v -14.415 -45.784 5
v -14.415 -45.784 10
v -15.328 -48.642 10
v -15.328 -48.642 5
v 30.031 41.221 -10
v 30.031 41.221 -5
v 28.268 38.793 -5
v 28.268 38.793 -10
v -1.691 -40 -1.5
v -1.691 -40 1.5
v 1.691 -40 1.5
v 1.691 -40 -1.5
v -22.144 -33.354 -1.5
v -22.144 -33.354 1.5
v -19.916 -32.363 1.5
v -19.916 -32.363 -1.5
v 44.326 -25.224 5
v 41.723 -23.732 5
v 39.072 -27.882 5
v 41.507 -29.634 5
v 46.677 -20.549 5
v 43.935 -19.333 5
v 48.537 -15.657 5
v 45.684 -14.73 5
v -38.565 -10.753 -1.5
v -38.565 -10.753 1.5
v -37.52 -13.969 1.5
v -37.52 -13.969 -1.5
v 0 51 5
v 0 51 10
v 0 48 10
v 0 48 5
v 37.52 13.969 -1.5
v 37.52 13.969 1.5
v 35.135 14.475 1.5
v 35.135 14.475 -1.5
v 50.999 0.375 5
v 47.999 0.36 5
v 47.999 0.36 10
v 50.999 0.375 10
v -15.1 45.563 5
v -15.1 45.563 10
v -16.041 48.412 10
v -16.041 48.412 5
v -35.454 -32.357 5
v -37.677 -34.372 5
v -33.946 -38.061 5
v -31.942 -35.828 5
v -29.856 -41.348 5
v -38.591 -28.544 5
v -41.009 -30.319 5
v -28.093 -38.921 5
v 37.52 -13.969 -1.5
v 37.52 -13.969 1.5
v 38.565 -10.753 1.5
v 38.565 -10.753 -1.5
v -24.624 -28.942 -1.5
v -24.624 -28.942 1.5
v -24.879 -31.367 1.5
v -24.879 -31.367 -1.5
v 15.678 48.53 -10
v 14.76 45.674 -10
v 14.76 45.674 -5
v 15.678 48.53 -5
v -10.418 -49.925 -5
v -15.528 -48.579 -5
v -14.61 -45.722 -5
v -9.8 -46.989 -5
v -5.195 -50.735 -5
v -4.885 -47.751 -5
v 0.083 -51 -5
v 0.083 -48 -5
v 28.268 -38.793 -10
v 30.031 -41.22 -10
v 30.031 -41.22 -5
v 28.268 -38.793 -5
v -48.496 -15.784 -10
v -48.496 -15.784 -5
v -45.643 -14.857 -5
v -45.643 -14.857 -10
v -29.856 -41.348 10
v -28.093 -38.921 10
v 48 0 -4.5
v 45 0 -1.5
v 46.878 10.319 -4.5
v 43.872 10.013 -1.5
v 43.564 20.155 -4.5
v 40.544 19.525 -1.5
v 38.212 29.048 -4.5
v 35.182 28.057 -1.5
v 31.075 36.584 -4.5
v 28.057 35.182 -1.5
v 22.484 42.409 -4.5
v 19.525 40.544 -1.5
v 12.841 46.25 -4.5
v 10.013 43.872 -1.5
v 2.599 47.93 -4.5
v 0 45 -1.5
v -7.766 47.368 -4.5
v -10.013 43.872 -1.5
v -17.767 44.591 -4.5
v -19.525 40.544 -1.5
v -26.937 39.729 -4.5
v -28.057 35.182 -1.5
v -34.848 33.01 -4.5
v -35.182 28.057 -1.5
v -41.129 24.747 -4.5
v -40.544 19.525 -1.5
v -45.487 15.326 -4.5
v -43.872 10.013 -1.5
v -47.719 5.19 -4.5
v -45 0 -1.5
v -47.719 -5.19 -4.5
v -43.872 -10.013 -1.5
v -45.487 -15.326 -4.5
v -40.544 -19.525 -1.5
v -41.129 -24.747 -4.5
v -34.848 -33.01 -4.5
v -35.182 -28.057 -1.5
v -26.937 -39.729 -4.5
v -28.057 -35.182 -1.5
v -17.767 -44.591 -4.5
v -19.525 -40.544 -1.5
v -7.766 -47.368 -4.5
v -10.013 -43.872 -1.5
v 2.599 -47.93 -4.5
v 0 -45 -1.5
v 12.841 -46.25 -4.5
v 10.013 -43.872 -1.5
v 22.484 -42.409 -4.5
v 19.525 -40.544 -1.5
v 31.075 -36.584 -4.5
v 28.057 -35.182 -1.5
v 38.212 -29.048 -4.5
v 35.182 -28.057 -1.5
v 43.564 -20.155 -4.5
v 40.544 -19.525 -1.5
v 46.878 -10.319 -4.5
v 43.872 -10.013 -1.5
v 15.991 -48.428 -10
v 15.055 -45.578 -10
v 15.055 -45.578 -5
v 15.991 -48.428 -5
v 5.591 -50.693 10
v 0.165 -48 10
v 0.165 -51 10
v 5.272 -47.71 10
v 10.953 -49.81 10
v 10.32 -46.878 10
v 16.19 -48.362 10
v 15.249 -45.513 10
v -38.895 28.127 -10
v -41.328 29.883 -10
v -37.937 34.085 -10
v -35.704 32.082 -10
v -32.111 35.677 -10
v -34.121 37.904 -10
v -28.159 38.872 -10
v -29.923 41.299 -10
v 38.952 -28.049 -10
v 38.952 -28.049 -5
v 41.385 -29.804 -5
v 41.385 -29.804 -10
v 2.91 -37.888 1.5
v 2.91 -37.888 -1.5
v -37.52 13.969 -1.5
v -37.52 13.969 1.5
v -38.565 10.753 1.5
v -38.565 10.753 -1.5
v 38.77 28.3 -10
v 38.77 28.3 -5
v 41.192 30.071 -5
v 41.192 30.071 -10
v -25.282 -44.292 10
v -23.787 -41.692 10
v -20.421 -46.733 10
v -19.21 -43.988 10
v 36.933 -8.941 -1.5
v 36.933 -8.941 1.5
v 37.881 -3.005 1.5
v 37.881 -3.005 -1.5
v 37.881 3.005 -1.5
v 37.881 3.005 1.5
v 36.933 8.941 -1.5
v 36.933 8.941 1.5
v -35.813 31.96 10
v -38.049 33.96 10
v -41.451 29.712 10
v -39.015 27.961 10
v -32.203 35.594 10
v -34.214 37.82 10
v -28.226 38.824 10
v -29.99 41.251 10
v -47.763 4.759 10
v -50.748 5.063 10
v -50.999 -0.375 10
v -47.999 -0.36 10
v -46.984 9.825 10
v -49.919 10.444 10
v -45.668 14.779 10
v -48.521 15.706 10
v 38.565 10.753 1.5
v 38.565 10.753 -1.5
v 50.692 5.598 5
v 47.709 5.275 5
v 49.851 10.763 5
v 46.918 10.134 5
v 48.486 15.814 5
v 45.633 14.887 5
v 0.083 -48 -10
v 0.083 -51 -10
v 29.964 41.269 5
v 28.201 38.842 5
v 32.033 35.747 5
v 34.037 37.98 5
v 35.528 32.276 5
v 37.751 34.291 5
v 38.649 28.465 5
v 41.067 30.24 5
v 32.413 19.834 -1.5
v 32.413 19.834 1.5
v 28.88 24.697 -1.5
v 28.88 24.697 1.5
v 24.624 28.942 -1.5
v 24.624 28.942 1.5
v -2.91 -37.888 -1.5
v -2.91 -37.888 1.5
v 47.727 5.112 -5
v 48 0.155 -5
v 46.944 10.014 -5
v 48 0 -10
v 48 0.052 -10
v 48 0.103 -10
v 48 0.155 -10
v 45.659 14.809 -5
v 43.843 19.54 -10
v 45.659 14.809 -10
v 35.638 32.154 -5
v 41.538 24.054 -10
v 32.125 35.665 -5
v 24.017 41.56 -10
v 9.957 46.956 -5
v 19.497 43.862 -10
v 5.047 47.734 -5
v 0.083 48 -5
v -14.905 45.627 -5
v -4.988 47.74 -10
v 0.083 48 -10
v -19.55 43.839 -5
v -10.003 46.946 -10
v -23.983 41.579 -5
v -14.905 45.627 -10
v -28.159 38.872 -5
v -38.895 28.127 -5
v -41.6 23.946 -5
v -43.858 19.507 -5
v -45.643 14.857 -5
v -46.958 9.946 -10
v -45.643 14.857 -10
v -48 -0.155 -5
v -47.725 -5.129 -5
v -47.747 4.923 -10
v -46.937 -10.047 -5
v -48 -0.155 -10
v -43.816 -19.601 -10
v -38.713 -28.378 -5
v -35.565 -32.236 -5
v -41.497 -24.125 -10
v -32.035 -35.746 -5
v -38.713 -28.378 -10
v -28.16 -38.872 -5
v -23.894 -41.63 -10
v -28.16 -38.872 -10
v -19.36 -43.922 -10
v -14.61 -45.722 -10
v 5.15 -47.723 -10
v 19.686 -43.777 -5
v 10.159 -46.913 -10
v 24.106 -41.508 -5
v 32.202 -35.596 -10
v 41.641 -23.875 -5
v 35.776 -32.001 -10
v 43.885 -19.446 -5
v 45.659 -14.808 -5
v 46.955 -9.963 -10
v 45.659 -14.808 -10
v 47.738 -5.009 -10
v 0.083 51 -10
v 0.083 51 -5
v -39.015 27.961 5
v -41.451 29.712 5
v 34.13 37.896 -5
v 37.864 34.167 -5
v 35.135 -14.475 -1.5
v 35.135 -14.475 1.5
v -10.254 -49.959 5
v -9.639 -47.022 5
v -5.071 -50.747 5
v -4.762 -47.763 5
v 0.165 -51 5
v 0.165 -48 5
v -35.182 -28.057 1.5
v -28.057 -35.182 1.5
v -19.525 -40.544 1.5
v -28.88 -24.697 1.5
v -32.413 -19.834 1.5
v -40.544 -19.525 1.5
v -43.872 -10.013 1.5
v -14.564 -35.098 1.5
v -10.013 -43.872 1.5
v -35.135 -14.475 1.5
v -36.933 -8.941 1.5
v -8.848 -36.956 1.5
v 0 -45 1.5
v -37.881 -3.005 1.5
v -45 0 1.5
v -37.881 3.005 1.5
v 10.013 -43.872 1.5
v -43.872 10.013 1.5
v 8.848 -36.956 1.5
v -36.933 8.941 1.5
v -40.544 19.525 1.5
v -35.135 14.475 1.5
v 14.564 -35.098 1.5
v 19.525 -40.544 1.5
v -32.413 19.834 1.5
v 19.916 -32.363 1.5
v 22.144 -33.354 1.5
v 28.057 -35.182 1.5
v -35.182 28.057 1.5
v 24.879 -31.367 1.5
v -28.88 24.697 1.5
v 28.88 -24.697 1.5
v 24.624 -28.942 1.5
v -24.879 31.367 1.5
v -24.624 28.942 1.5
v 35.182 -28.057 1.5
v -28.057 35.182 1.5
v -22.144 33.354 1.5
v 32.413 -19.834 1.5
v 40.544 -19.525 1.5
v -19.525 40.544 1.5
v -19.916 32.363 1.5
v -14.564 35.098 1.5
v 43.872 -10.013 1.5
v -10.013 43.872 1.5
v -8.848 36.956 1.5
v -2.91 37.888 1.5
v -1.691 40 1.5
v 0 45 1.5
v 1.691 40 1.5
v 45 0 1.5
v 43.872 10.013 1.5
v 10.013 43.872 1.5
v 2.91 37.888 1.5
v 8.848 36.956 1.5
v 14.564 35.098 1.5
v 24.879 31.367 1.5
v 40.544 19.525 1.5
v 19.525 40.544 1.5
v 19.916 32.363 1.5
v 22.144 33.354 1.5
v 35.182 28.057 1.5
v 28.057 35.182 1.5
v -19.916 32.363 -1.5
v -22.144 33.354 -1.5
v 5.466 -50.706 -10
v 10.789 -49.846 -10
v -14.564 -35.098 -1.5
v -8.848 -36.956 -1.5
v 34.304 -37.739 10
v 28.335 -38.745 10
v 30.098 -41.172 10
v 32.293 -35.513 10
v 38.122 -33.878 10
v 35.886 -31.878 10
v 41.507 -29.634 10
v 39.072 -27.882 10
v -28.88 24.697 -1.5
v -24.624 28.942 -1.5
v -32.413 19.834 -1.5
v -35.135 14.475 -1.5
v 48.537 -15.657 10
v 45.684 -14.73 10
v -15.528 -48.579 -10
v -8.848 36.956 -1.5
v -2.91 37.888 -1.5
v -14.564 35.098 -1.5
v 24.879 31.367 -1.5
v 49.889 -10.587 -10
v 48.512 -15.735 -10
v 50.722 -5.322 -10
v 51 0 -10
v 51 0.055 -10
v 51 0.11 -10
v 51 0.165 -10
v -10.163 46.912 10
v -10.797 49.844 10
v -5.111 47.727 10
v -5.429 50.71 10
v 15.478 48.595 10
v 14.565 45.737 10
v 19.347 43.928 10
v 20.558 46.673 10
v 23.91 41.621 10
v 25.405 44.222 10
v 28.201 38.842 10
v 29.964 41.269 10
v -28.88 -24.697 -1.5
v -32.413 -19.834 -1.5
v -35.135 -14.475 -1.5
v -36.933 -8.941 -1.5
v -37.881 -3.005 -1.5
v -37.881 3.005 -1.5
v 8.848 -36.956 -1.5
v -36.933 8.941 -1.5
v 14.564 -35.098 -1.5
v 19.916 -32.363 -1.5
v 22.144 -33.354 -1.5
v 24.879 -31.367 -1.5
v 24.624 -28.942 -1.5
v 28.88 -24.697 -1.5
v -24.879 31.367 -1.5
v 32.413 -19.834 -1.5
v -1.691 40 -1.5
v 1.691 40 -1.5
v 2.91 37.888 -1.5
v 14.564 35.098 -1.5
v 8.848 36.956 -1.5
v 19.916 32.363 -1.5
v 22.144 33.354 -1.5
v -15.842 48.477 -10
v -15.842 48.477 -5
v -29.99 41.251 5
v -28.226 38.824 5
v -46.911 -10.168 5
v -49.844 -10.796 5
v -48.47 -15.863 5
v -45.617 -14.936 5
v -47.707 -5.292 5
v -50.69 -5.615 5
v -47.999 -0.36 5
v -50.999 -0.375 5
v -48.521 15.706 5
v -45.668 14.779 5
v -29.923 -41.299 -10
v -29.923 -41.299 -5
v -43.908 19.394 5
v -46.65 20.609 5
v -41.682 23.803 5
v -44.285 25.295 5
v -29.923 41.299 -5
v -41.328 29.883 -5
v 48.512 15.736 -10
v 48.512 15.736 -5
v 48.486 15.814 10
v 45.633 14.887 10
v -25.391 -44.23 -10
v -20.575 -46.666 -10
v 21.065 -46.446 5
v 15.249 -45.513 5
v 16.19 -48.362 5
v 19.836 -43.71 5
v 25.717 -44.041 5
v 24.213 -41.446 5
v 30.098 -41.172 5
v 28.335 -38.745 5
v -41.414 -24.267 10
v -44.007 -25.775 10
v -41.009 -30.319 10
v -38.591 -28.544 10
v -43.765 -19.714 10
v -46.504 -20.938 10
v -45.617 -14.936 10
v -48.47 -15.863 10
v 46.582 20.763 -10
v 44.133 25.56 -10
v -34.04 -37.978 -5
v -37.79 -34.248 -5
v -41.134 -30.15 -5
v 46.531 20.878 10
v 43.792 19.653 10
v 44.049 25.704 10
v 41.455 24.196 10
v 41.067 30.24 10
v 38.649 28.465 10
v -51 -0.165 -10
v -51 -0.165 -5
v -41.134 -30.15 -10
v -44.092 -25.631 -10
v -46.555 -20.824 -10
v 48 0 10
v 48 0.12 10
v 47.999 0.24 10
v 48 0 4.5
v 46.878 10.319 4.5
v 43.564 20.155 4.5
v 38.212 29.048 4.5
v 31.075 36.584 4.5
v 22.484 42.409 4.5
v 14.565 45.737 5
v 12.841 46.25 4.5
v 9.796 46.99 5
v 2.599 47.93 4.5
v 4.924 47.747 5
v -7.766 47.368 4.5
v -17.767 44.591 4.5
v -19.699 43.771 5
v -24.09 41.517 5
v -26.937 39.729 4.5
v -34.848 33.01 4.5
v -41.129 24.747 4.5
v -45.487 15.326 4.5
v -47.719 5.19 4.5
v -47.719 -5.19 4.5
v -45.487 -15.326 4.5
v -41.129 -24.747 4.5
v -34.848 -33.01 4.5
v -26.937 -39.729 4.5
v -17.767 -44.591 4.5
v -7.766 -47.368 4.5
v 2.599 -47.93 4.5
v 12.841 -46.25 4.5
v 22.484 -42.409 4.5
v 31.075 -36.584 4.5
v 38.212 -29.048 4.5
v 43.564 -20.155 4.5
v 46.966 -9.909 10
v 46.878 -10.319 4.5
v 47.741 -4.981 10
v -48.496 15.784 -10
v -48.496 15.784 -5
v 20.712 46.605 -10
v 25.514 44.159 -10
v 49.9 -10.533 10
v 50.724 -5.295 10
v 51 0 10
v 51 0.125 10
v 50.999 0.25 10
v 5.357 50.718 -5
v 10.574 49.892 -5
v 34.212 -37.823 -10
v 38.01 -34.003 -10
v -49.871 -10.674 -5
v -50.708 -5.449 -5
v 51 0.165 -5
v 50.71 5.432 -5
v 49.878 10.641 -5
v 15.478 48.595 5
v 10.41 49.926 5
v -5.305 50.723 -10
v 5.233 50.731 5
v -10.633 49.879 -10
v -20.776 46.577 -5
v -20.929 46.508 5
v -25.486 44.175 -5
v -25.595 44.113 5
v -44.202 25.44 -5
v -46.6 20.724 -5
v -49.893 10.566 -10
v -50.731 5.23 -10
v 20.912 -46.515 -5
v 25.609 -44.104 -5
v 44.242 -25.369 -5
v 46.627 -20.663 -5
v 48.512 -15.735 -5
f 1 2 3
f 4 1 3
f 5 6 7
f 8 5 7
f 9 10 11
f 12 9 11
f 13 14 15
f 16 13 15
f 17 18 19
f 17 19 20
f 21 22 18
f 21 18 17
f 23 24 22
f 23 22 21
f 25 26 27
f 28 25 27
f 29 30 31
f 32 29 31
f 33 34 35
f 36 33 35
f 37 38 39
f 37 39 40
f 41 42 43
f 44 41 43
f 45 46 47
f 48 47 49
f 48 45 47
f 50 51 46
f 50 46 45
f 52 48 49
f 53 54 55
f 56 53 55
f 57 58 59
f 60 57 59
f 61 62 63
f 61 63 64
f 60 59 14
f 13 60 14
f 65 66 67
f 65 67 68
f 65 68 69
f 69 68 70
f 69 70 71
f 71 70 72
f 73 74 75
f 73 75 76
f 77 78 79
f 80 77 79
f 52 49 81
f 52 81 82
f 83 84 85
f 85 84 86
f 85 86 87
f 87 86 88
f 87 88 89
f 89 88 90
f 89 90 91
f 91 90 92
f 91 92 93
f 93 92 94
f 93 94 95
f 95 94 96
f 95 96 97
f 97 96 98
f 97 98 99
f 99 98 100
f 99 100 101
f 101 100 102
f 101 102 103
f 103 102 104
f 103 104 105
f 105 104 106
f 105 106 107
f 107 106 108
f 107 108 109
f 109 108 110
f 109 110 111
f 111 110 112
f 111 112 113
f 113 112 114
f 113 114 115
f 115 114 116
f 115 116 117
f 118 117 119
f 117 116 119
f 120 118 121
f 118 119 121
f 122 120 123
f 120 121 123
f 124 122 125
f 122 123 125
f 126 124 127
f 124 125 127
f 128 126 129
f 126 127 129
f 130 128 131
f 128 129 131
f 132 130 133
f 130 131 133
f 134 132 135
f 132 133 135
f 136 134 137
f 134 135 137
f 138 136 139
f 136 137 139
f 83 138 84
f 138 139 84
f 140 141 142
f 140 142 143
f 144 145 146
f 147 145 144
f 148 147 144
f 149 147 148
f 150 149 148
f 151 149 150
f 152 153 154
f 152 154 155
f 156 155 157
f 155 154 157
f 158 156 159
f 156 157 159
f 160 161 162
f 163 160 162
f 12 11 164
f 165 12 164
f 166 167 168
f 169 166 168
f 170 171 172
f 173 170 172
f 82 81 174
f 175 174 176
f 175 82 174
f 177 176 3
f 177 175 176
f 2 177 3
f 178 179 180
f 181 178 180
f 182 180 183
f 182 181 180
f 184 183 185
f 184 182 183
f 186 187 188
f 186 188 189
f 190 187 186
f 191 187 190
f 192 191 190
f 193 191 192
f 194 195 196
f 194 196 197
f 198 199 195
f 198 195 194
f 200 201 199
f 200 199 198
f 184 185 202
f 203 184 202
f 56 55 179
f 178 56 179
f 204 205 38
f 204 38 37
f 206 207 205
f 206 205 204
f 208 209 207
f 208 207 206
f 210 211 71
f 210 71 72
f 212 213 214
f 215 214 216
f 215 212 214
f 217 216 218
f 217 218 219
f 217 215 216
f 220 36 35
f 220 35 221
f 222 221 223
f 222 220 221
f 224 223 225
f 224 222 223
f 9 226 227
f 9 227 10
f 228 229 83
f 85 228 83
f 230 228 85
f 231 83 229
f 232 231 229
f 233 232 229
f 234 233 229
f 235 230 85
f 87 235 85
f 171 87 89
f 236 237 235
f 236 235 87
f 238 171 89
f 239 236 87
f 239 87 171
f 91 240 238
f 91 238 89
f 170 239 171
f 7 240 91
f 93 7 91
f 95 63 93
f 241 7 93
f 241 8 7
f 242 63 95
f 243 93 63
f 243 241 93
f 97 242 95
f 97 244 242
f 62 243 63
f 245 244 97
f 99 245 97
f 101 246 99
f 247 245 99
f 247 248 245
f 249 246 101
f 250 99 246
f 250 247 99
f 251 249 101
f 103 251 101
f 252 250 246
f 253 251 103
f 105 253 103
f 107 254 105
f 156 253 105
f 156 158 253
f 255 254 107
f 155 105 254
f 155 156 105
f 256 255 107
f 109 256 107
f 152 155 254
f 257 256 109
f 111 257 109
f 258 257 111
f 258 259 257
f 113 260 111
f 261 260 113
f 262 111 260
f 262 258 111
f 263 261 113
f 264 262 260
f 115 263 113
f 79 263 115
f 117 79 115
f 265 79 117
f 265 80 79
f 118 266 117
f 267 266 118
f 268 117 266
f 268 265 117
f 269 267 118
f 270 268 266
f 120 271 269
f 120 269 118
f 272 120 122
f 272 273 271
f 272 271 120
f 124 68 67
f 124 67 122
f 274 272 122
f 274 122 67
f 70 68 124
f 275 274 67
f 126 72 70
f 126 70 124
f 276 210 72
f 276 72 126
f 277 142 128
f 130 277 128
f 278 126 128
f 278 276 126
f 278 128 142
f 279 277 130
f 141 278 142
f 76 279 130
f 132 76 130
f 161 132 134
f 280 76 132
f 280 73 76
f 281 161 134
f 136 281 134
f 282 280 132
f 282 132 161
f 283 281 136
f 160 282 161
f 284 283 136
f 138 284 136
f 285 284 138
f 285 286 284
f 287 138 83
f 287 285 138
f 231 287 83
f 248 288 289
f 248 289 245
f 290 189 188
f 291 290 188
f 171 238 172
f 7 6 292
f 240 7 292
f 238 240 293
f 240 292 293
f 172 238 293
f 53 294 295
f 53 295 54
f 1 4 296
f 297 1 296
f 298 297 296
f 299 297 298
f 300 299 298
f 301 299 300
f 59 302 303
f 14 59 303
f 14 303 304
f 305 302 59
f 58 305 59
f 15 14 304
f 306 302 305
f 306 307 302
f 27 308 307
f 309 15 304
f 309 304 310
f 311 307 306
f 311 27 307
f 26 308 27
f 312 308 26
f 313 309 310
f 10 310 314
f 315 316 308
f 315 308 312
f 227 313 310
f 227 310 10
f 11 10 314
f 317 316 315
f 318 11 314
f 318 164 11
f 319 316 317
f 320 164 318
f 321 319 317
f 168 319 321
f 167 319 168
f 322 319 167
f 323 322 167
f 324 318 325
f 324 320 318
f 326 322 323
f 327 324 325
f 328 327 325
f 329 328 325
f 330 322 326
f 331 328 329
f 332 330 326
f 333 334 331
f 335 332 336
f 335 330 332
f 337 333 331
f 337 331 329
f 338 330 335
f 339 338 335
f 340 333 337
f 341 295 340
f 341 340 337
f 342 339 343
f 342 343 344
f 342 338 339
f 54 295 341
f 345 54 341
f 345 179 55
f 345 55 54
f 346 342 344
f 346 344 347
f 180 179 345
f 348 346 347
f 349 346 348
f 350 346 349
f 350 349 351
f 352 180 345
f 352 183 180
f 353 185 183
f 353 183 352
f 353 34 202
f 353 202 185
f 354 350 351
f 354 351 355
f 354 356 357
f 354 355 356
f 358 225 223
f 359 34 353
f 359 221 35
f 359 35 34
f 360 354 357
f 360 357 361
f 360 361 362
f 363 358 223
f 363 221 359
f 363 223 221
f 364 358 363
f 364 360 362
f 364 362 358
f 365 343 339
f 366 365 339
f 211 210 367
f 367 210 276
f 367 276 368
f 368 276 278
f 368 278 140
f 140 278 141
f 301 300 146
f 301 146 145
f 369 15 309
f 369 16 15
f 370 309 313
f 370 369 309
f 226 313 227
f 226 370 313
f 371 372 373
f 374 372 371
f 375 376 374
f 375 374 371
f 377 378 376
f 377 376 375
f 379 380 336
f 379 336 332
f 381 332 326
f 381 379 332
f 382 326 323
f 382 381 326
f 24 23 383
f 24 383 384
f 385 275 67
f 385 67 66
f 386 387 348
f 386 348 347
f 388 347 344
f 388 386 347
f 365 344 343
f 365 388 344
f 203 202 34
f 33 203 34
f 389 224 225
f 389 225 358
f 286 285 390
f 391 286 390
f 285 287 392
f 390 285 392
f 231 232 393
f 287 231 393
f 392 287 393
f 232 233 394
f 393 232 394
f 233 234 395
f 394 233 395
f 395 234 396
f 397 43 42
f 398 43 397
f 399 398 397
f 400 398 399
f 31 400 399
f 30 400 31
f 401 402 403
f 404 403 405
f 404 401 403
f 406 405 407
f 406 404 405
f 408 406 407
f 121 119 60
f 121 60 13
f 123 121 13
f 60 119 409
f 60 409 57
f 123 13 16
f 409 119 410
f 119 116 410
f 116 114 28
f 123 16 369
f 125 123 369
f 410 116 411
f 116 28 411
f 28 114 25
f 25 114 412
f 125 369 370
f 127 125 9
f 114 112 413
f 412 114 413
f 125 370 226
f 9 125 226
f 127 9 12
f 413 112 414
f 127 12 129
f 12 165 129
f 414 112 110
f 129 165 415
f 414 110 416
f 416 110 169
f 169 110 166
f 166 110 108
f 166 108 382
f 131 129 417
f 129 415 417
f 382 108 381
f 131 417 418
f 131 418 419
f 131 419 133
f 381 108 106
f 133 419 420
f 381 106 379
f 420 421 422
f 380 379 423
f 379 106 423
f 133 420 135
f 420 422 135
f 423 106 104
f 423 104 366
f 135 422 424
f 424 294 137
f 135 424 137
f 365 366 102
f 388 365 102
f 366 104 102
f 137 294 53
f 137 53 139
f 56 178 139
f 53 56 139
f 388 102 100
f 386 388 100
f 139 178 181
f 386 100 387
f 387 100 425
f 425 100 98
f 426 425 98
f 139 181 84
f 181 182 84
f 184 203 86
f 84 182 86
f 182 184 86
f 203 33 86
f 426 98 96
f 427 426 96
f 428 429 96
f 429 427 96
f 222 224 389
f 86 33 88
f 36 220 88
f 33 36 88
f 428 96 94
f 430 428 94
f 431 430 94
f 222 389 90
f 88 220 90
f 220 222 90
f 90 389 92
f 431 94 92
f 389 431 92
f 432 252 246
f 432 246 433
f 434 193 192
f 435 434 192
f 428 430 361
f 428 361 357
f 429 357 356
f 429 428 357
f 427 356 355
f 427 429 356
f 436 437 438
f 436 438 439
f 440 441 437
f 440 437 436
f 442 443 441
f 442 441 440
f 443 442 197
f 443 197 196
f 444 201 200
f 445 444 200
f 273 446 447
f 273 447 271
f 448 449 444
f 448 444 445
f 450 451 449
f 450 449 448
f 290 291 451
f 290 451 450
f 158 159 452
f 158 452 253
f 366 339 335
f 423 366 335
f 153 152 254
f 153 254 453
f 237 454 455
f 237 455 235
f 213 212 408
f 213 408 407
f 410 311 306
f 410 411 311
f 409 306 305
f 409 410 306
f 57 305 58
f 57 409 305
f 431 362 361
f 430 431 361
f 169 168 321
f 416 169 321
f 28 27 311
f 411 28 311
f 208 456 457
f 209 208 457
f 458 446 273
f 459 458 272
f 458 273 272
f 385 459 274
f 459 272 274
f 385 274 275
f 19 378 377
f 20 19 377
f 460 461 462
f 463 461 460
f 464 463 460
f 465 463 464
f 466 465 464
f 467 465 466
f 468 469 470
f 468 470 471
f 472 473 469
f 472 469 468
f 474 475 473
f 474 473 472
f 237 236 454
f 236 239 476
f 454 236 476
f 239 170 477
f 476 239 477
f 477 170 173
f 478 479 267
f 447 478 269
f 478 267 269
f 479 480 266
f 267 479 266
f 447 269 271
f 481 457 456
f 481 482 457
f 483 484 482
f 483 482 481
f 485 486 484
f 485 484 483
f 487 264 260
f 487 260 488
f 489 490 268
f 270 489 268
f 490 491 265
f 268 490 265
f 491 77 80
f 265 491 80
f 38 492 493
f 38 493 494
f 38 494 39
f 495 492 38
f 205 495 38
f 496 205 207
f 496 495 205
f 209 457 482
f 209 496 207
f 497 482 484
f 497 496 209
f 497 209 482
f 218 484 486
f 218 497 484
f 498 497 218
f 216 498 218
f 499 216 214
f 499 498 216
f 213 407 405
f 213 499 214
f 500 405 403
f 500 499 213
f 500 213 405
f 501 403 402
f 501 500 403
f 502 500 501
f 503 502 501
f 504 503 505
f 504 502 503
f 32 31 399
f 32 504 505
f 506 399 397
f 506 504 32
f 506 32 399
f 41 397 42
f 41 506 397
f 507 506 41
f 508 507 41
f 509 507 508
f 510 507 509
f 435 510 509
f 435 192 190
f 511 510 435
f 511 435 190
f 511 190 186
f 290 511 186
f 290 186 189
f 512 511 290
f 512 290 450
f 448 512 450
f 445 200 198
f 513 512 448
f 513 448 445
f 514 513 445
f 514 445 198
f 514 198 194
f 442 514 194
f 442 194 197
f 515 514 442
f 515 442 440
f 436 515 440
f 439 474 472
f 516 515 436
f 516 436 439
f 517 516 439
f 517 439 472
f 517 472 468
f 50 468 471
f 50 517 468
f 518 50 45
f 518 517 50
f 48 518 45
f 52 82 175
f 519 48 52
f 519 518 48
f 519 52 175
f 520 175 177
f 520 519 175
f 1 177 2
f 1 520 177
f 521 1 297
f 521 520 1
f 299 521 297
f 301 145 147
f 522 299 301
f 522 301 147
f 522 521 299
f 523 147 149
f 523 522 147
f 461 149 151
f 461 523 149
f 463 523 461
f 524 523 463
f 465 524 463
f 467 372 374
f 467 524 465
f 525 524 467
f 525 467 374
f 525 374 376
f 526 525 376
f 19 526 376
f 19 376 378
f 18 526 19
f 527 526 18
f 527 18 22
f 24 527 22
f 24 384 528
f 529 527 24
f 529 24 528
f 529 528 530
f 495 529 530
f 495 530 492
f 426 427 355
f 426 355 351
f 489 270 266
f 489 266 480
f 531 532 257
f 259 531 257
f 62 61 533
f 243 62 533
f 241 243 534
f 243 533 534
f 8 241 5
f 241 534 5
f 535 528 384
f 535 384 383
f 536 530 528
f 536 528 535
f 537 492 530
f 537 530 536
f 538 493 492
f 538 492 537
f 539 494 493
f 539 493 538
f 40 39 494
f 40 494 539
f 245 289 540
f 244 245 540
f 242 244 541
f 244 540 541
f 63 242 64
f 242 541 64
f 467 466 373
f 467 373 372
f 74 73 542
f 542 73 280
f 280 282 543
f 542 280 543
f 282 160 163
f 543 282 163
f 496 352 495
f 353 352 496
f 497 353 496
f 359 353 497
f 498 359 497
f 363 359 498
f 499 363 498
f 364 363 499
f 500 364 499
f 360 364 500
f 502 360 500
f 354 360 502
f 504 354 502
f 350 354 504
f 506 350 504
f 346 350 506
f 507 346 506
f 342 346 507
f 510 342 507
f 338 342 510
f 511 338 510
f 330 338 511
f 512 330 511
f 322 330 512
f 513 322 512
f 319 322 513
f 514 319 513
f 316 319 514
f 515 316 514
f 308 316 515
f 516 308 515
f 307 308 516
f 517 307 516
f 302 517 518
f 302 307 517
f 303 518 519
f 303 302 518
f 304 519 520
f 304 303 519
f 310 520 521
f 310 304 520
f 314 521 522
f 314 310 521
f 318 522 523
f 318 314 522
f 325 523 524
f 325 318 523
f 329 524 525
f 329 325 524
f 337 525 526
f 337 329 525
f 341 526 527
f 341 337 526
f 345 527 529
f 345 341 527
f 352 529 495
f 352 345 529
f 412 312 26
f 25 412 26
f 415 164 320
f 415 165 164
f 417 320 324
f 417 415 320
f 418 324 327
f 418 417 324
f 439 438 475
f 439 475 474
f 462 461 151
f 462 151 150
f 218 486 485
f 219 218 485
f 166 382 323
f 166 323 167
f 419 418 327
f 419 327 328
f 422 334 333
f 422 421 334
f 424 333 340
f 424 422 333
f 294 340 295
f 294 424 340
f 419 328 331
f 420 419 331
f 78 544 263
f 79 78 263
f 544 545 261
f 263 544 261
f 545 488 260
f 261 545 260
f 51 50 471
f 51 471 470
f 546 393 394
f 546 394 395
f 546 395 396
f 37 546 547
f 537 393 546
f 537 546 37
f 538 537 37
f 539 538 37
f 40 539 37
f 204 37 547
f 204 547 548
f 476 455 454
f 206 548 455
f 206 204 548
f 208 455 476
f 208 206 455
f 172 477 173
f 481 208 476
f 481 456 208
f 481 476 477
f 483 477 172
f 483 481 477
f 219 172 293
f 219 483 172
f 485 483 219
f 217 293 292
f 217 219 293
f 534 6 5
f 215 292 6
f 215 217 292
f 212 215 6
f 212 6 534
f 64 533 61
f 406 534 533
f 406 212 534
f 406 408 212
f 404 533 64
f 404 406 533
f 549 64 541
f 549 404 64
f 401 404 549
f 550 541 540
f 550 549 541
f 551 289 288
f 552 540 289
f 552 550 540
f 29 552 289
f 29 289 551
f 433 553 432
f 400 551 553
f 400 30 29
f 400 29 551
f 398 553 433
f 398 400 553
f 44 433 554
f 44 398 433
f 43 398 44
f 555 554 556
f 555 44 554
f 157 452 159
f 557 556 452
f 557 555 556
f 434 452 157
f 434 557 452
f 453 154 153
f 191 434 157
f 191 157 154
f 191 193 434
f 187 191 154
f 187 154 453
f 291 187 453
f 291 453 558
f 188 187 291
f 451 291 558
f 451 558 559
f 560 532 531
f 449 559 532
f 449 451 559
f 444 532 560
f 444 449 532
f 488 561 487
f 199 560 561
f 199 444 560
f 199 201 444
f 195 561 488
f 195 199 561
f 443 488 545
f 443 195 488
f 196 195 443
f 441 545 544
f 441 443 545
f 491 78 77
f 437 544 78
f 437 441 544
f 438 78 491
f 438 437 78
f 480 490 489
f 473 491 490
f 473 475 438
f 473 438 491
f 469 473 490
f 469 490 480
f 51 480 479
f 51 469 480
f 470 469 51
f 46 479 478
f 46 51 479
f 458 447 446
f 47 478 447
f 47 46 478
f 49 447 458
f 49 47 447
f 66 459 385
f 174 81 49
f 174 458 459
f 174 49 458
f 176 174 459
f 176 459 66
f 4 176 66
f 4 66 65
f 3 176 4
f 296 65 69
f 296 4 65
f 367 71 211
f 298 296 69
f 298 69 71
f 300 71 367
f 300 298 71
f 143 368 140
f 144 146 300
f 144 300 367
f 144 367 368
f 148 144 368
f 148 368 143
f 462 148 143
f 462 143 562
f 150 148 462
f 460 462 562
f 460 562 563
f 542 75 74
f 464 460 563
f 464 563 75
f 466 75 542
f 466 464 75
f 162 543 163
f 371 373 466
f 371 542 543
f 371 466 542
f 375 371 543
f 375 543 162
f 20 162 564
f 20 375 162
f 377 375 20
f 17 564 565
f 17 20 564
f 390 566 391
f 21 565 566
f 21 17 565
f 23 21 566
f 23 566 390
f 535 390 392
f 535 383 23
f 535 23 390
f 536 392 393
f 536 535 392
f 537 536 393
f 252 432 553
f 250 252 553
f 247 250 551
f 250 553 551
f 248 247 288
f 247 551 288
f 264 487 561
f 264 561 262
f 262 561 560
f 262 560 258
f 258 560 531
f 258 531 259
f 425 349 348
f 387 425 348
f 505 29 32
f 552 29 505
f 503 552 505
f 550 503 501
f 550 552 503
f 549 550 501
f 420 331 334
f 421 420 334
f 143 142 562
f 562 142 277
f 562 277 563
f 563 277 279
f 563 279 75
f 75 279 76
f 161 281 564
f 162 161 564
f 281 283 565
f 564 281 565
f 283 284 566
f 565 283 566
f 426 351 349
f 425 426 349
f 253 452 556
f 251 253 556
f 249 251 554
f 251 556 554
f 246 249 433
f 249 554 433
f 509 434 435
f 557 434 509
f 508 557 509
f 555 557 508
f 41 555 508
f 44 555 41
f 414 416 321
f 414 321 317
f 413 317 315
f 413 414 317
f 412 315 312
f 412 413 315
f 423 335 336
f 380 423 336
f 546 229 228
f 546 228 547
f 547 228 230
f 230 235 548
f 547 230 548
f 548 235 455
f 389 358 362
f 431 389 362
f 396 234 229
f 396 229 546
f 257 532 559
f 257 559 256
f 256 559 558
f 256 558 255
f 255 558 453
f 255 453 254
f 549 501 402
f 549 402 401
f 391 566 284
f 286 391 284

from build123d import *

# Parameters (mm, degrees)
F0_R      = 51
F0_R_2    = 48
F1_DEPTH  = 10
F0_R_3    = 38
F2_DEPTH  = 1.5
F5_DEPTH  = 25
F8_DEPTH  = 25
F11_DEPTH = 25
F12_SIZE  = 3


with BuildPart() as f1:
    # F0 (on Top) → F1 (new body, symmetric)
    with BuildSketch(Plane.XY):
        Circle(F0_R)
        Circle(F0_R_2, mode=Mode.SUBTRACT)
    extrude(amount=F1_DEPTH, both=True)

    # F0 (on Top) → F2 (join, symmetric)
    with BuildSketch(Plane.XY):
        Circle(F0_R_2)
        Circle(F0_R_3, mode=Mode.SUBTRACT)
    extrude(amount=F2_DEPTH, both=True)

    # F4 (on offset) → F5 (cut)
    with BuildSketch(Plane.XY.offset(15)):
        Polygon((-1.690599, 40), (-4, 36), (4, 36), (1.690599, 40), align=None)
        Polygon((-17.924201, 31.475753), (-22.143687, 33.354389), (-24.879133, 31.366971), (-24.396337, 26.773471), align=None)
        Polygon((-33.001967, 14.928838), (-37.519837, 13.968535), (-38.564684, 10.752825), (-35.474103, 7.320386), align=None)
        Polygon((-35.474103, -7.320386), (-38.564684, -10.752825), (-37.519837, -13.968535), (-33.001967, -14.928838), align=None)
        Polygon((-24.396337, -26.773471), (-24.879133, -31.366971), (-22.143687, -33.354389), (-17.924201, -31.475753), align=None)
        Polygon((-4, -36), (-1.690599, -40), (1.690599, -40), (4, -36), align=None)
        Polygon((17.924201, -31.475753), (22.143687, -33.354389), (24.879133, -31.366971), (24.396337, -26.773471), align=None)
        Polygon((33.001967, -14.928838), (37.519837, -13.968535), (38.564684, -10.752825), (35.474103, -7.320386), align=None)
        Polygon((35.474103, 7.320386), (38.564684, 10.752825), (37.519837, 13.968535), (33.001967, 14.928838), align=None)
        Polygon((24.396337, 26.773471), (24.879133, 31.366971), (22.143687, 33.354389), (17.924201, 31.475753), align=None)
    extrude(amount=-F5_DEPTH, mode=Mode.SUBTRACT)

    # F7 (on offset) → F8 (cut)
    with BuildSketch(Plane.XY.offset(30)):
        with BuildLine():
            Line((0, 55.1512), (0, 35.000008))
            ThreePointArc((0, 35.000008), (5.367163, 34.584221), (10.606253, 33.346784))
            Line((10.606253, 33.346784), (16.739279, 52.542006))
            ThreePointArc((16.739279, 52.542006), (8.470705, 54.494987), (0, 55.1512))
        make_face()
        with BuildLine():
            Line((-32.401203, 44.569659), (-20.556629, 28.267002))
            ThreePointArc((-20.556629, 28.267002), (-15.97011, 31.085363), (-11.004249, 33.163715))
            Line((-11.004249, 33.163715), (-17.325195, 52.297878))
            ThreePointArc((-17.325195, 52.297878), (-25.162546, 49.017727), (-32.401203, 44.569659))
        make_face()
        with BuildLine():
            Line((-52.394652, 16.964063), (-33.229729, 10.737002))
            ThreePointArc((-33.229729, 10.737002), (-31.175748, 15.712992), (-28.379908, 20.313274))
            Line((-28.379908, 20.313274), (-44.740439, 32.077778))
            ThreePointArc((-44.740439, 32.077778), (-49.152965, 24.817401), (-52.394652, 16.964063))
        make_face()
        with BuildLine():
            Line((-52.343531, -17.121188), (-33.178608, -10.894127))
            ThreePointArc((-33.178608, -10.894127), (-34.441716, -5.661167), (-34.883811, -0.296107))
            Line((-34.883811, -0.296107), (-55.034761, -0.394902))
            ThreePointArc((-55.034761, -0.394902), (-54.337027, -8.862288), (-52.343531, -17.121188))
        make_face()
        with BuildLine():
            Line((-32.267365, -44.666687), (-20.422791, -28.36403))
            ThreePointArc((-20.422791, -28.36403), (-24.520524, -24.872912), (-28.031689, -20.792345))
            Line((-28.031689, -20.792345), (-44.27608, -32.716703))
            ThreePointArc((-44.27608, -32.716703), (-38.734596, -39.156844), (-32.267365, -44.666687))
        make_face()
        with BuildLine():
            Line((0.165433, -55.150989), (0.165433, -34.999797))
            ThreePointArc((0.165433, -34.999797), (-5.20173, -34.58401), (-10.44082, -33.346573))
            Line((-10.44082, -33.346573), (-16.573846, -52.541795))
            ThreePointArc((-16.573846, -52.541795), (-8.305272, -54.494776), (0.165433, -55.150989))
        make_face()
        with BuildLine():
            Line((32.566636, -44.569448), (20.722062, -28.266791))
            ThreePointArc((20.722062, -28.266791), (16.135543, -31.085152), (11.169682, -33.163504))
            Line((11.169682, -33.163504), (17.490629, -52.297667))
            ThreePointArc((17.490629, -52.297667), (25.327979, -49.017516), (32.566636, -44.569448))
        make_face()
        with BuildLine():
            Line((52.560085, -16.963852), (33.395162, -10.736791))
            ThreePointArc((33.395162, -10.736791), (31.341182, -15.712781), (28.545341, -20.313063))
            Line((28.545341, -20.313063), (44.905873, -32.077567))
            ThreePointArc((44.905873, -32.077567), (49.318398, -24.81719), (52.560085, -16.963852))
        make_face()
        with BuildLine():
            Line((52.508964, 17.121399), (33.344041, 10.894338))
            ThreePointArc((33.344041, 10.894338), (34.607149, 5.661378), (35.049244, 0.296318))
            Line((35.049244, 0.296318), (55.200194, 0.395113))
            ThreePointArc((55.200194, 0.395113), (54.50246, 8.862499), (52.508964, 17.121399))
        make_face()
        with BuildLine():
            Line((32.432798, 44.666898), (20.588224, 28.364241))
            ThreePointArc((20.588224, 28.364241), (24.685957, 24.873123), (28.197122, 20.792556))
            Line((28.197122, 20.792556), (44.441513, 32.716914))
            ThreePointArc((44.441513, 32.716914), (38.900029, 39.157055), (32.432798, 44.666898))
        make_face()
    extrude(amount=-F8_DEPTH, mode=Mode.SUBTRACT)

    # F10 (on offset) → F11 (cut)
    with BuildSketch(Plane.XY.offset(-30)):
        with BuildLine():
            Line((0.082717, 55.000105), (0.082717, 35.346372))
            ThreePointArc((0.082717, 35.346372), (5.555695, 34.920086), (10.896661, 33.651511))
            Line((10.896661, 33.651511), (16.909585, 52.362845))
            ThreePointArc((16.909585, 52.362845), (8.598858, 54.336791), (0.082717, 55.000105))
        make_face()
        with BuildLine():
            Line((-32.245472, 44.49604), (-20.693297, 28.595835))
            ThreePointArc((-20.693297, 28.595835), (-16.015001, 31.467899), (-10.948419, 33.580942))
            Line((-10.948419, 33.580942), (-17.082107, 52.253037))
            ThreePointArc((-17.082107, 52.253037), (-24.965883, 48.965069), (-32.245472, 44.49604))
        make_face()
        with BuildLine():
            Line((-52.225392, 16.99604), (-33.53358, 10.922702))
            ThreePointArc((-33.53358, 10.922702), (-31.436915, 15.996084), (-28.57998, 20.683634))
            Line((-28.57998, 20.683634), (-44.51742, 32.184385))
            ThreePointArc((-44.51742, 32.184385), (-48.962909, 24.890396), (-52.225392, 16.99604))
        make_face()
        with BuildLine():
            Line((-52.225392, -16.995829), (-33.53358, -10.922491))
            ThreePointArc((-33.53358, -10.922491), (-34.819402, -5.585651), (-35.263365, -0.114078))
            Line((-35.263365, -0.114078), (-54.916996, -0.177568))
            ThreePointArc((-54.916996, -0.177568), (-54.226174, -8.691522), (-52.225392, -16.995829))
        make_face()
        with BuildLine():
            Line((-32.245472, -44.495829), (-20.693297, -28.595624))
            ThreePointArc((-20.693297, -28.595624), (-24.870465, -25.033816), (-28.445749, -20.868177))
            Line((-28.445749, -20.868177), (-44.308552, -32.471656))
            ThreePointArc((-44.308552, -32.471656), (-38.745288, -38.953534), (-32.245472, -44.495829))
        make_face()
        with BuildLine():
            Line((0.082717, -54.999895), (0.082717, -35.346161))
            ThreePointArc((0.082717, -35.346161), (-5.390261, -34.919875), (-10.731228, -33.6513))
            Line((-10.731228, -33.6513), (-16.744152, -52.362634))
            ThreePointArc((-16.744152, -52.362634), (-8.433425, -54.33658), (0.082717, -54.999895))
        make_face()
        with BuildLine():
            Line((32.410905, -44.495829), (20.85873, -28.595624))
            ThreePointArc((20.85873, -28.595624), (16.180434, -31.467688), (11.113852, -33.580731))
            Line((11.113852, -33.580731), (17.24754, -52.252826))
            ThreePointArc((17.24754, -52.252826), (25.131316, -48.964858), (32.410905, -44.495829))
        make_face()
        with BuildLine():
            Line((52.390825, -16.995829), (33.699013, -10.922491))
            ThreePointArc((33.699013, -10.922491), (31.602348, -15.995873), (28.745413, -20.683423))
            Line((28.745413, -20.683423), (44.682853, -32.184174))
            ThreePointArc((44.682853, -32.184174), (49.128343, -24.890185), (52.390825, -16.995829))
        make_face()
        with BuildLine():
            Line((52.390825, 16.99604), (33.699013, 10.922702))
            ThreePointArc((33.699013, 10.922702), (34.984835, 5.585862), (35.428798, 0.114289))
            Line((35.428798, 0.114289), (55.08243, 0.177779))
            ThreePointArc((55.08243, 0.177779), (54.391607, 8.691733), (52.390825, 16.99604))
        make_face()
        with BuildLine():
            Line((32.410905, 44.49604), (20.85873, 28.595835))
            ThreePointArc((20.85873, 28.595835), (25.035898, 25.034027), (28.611182, 20.868388))
            Line((28.611182, 20.868388), (44.473985, 32.471867))
            ThreePointArc((44.473985, 32.471867), (38.910722, 38.953745), (32.410905, 44.49604))
        make_face()
    extrude(amount=F11_DEPTH, mode=Mode.SUBTRACT)

    # F12
    f12_edges = [f1.edges().sort_by_distance(p)[0] for p in [
        (-48, 0, 1.5),
        (-48, 0, -1.5),
    ]]
    chamfer(f12_edges, length=F12_SIZE)


solid = f1.part
